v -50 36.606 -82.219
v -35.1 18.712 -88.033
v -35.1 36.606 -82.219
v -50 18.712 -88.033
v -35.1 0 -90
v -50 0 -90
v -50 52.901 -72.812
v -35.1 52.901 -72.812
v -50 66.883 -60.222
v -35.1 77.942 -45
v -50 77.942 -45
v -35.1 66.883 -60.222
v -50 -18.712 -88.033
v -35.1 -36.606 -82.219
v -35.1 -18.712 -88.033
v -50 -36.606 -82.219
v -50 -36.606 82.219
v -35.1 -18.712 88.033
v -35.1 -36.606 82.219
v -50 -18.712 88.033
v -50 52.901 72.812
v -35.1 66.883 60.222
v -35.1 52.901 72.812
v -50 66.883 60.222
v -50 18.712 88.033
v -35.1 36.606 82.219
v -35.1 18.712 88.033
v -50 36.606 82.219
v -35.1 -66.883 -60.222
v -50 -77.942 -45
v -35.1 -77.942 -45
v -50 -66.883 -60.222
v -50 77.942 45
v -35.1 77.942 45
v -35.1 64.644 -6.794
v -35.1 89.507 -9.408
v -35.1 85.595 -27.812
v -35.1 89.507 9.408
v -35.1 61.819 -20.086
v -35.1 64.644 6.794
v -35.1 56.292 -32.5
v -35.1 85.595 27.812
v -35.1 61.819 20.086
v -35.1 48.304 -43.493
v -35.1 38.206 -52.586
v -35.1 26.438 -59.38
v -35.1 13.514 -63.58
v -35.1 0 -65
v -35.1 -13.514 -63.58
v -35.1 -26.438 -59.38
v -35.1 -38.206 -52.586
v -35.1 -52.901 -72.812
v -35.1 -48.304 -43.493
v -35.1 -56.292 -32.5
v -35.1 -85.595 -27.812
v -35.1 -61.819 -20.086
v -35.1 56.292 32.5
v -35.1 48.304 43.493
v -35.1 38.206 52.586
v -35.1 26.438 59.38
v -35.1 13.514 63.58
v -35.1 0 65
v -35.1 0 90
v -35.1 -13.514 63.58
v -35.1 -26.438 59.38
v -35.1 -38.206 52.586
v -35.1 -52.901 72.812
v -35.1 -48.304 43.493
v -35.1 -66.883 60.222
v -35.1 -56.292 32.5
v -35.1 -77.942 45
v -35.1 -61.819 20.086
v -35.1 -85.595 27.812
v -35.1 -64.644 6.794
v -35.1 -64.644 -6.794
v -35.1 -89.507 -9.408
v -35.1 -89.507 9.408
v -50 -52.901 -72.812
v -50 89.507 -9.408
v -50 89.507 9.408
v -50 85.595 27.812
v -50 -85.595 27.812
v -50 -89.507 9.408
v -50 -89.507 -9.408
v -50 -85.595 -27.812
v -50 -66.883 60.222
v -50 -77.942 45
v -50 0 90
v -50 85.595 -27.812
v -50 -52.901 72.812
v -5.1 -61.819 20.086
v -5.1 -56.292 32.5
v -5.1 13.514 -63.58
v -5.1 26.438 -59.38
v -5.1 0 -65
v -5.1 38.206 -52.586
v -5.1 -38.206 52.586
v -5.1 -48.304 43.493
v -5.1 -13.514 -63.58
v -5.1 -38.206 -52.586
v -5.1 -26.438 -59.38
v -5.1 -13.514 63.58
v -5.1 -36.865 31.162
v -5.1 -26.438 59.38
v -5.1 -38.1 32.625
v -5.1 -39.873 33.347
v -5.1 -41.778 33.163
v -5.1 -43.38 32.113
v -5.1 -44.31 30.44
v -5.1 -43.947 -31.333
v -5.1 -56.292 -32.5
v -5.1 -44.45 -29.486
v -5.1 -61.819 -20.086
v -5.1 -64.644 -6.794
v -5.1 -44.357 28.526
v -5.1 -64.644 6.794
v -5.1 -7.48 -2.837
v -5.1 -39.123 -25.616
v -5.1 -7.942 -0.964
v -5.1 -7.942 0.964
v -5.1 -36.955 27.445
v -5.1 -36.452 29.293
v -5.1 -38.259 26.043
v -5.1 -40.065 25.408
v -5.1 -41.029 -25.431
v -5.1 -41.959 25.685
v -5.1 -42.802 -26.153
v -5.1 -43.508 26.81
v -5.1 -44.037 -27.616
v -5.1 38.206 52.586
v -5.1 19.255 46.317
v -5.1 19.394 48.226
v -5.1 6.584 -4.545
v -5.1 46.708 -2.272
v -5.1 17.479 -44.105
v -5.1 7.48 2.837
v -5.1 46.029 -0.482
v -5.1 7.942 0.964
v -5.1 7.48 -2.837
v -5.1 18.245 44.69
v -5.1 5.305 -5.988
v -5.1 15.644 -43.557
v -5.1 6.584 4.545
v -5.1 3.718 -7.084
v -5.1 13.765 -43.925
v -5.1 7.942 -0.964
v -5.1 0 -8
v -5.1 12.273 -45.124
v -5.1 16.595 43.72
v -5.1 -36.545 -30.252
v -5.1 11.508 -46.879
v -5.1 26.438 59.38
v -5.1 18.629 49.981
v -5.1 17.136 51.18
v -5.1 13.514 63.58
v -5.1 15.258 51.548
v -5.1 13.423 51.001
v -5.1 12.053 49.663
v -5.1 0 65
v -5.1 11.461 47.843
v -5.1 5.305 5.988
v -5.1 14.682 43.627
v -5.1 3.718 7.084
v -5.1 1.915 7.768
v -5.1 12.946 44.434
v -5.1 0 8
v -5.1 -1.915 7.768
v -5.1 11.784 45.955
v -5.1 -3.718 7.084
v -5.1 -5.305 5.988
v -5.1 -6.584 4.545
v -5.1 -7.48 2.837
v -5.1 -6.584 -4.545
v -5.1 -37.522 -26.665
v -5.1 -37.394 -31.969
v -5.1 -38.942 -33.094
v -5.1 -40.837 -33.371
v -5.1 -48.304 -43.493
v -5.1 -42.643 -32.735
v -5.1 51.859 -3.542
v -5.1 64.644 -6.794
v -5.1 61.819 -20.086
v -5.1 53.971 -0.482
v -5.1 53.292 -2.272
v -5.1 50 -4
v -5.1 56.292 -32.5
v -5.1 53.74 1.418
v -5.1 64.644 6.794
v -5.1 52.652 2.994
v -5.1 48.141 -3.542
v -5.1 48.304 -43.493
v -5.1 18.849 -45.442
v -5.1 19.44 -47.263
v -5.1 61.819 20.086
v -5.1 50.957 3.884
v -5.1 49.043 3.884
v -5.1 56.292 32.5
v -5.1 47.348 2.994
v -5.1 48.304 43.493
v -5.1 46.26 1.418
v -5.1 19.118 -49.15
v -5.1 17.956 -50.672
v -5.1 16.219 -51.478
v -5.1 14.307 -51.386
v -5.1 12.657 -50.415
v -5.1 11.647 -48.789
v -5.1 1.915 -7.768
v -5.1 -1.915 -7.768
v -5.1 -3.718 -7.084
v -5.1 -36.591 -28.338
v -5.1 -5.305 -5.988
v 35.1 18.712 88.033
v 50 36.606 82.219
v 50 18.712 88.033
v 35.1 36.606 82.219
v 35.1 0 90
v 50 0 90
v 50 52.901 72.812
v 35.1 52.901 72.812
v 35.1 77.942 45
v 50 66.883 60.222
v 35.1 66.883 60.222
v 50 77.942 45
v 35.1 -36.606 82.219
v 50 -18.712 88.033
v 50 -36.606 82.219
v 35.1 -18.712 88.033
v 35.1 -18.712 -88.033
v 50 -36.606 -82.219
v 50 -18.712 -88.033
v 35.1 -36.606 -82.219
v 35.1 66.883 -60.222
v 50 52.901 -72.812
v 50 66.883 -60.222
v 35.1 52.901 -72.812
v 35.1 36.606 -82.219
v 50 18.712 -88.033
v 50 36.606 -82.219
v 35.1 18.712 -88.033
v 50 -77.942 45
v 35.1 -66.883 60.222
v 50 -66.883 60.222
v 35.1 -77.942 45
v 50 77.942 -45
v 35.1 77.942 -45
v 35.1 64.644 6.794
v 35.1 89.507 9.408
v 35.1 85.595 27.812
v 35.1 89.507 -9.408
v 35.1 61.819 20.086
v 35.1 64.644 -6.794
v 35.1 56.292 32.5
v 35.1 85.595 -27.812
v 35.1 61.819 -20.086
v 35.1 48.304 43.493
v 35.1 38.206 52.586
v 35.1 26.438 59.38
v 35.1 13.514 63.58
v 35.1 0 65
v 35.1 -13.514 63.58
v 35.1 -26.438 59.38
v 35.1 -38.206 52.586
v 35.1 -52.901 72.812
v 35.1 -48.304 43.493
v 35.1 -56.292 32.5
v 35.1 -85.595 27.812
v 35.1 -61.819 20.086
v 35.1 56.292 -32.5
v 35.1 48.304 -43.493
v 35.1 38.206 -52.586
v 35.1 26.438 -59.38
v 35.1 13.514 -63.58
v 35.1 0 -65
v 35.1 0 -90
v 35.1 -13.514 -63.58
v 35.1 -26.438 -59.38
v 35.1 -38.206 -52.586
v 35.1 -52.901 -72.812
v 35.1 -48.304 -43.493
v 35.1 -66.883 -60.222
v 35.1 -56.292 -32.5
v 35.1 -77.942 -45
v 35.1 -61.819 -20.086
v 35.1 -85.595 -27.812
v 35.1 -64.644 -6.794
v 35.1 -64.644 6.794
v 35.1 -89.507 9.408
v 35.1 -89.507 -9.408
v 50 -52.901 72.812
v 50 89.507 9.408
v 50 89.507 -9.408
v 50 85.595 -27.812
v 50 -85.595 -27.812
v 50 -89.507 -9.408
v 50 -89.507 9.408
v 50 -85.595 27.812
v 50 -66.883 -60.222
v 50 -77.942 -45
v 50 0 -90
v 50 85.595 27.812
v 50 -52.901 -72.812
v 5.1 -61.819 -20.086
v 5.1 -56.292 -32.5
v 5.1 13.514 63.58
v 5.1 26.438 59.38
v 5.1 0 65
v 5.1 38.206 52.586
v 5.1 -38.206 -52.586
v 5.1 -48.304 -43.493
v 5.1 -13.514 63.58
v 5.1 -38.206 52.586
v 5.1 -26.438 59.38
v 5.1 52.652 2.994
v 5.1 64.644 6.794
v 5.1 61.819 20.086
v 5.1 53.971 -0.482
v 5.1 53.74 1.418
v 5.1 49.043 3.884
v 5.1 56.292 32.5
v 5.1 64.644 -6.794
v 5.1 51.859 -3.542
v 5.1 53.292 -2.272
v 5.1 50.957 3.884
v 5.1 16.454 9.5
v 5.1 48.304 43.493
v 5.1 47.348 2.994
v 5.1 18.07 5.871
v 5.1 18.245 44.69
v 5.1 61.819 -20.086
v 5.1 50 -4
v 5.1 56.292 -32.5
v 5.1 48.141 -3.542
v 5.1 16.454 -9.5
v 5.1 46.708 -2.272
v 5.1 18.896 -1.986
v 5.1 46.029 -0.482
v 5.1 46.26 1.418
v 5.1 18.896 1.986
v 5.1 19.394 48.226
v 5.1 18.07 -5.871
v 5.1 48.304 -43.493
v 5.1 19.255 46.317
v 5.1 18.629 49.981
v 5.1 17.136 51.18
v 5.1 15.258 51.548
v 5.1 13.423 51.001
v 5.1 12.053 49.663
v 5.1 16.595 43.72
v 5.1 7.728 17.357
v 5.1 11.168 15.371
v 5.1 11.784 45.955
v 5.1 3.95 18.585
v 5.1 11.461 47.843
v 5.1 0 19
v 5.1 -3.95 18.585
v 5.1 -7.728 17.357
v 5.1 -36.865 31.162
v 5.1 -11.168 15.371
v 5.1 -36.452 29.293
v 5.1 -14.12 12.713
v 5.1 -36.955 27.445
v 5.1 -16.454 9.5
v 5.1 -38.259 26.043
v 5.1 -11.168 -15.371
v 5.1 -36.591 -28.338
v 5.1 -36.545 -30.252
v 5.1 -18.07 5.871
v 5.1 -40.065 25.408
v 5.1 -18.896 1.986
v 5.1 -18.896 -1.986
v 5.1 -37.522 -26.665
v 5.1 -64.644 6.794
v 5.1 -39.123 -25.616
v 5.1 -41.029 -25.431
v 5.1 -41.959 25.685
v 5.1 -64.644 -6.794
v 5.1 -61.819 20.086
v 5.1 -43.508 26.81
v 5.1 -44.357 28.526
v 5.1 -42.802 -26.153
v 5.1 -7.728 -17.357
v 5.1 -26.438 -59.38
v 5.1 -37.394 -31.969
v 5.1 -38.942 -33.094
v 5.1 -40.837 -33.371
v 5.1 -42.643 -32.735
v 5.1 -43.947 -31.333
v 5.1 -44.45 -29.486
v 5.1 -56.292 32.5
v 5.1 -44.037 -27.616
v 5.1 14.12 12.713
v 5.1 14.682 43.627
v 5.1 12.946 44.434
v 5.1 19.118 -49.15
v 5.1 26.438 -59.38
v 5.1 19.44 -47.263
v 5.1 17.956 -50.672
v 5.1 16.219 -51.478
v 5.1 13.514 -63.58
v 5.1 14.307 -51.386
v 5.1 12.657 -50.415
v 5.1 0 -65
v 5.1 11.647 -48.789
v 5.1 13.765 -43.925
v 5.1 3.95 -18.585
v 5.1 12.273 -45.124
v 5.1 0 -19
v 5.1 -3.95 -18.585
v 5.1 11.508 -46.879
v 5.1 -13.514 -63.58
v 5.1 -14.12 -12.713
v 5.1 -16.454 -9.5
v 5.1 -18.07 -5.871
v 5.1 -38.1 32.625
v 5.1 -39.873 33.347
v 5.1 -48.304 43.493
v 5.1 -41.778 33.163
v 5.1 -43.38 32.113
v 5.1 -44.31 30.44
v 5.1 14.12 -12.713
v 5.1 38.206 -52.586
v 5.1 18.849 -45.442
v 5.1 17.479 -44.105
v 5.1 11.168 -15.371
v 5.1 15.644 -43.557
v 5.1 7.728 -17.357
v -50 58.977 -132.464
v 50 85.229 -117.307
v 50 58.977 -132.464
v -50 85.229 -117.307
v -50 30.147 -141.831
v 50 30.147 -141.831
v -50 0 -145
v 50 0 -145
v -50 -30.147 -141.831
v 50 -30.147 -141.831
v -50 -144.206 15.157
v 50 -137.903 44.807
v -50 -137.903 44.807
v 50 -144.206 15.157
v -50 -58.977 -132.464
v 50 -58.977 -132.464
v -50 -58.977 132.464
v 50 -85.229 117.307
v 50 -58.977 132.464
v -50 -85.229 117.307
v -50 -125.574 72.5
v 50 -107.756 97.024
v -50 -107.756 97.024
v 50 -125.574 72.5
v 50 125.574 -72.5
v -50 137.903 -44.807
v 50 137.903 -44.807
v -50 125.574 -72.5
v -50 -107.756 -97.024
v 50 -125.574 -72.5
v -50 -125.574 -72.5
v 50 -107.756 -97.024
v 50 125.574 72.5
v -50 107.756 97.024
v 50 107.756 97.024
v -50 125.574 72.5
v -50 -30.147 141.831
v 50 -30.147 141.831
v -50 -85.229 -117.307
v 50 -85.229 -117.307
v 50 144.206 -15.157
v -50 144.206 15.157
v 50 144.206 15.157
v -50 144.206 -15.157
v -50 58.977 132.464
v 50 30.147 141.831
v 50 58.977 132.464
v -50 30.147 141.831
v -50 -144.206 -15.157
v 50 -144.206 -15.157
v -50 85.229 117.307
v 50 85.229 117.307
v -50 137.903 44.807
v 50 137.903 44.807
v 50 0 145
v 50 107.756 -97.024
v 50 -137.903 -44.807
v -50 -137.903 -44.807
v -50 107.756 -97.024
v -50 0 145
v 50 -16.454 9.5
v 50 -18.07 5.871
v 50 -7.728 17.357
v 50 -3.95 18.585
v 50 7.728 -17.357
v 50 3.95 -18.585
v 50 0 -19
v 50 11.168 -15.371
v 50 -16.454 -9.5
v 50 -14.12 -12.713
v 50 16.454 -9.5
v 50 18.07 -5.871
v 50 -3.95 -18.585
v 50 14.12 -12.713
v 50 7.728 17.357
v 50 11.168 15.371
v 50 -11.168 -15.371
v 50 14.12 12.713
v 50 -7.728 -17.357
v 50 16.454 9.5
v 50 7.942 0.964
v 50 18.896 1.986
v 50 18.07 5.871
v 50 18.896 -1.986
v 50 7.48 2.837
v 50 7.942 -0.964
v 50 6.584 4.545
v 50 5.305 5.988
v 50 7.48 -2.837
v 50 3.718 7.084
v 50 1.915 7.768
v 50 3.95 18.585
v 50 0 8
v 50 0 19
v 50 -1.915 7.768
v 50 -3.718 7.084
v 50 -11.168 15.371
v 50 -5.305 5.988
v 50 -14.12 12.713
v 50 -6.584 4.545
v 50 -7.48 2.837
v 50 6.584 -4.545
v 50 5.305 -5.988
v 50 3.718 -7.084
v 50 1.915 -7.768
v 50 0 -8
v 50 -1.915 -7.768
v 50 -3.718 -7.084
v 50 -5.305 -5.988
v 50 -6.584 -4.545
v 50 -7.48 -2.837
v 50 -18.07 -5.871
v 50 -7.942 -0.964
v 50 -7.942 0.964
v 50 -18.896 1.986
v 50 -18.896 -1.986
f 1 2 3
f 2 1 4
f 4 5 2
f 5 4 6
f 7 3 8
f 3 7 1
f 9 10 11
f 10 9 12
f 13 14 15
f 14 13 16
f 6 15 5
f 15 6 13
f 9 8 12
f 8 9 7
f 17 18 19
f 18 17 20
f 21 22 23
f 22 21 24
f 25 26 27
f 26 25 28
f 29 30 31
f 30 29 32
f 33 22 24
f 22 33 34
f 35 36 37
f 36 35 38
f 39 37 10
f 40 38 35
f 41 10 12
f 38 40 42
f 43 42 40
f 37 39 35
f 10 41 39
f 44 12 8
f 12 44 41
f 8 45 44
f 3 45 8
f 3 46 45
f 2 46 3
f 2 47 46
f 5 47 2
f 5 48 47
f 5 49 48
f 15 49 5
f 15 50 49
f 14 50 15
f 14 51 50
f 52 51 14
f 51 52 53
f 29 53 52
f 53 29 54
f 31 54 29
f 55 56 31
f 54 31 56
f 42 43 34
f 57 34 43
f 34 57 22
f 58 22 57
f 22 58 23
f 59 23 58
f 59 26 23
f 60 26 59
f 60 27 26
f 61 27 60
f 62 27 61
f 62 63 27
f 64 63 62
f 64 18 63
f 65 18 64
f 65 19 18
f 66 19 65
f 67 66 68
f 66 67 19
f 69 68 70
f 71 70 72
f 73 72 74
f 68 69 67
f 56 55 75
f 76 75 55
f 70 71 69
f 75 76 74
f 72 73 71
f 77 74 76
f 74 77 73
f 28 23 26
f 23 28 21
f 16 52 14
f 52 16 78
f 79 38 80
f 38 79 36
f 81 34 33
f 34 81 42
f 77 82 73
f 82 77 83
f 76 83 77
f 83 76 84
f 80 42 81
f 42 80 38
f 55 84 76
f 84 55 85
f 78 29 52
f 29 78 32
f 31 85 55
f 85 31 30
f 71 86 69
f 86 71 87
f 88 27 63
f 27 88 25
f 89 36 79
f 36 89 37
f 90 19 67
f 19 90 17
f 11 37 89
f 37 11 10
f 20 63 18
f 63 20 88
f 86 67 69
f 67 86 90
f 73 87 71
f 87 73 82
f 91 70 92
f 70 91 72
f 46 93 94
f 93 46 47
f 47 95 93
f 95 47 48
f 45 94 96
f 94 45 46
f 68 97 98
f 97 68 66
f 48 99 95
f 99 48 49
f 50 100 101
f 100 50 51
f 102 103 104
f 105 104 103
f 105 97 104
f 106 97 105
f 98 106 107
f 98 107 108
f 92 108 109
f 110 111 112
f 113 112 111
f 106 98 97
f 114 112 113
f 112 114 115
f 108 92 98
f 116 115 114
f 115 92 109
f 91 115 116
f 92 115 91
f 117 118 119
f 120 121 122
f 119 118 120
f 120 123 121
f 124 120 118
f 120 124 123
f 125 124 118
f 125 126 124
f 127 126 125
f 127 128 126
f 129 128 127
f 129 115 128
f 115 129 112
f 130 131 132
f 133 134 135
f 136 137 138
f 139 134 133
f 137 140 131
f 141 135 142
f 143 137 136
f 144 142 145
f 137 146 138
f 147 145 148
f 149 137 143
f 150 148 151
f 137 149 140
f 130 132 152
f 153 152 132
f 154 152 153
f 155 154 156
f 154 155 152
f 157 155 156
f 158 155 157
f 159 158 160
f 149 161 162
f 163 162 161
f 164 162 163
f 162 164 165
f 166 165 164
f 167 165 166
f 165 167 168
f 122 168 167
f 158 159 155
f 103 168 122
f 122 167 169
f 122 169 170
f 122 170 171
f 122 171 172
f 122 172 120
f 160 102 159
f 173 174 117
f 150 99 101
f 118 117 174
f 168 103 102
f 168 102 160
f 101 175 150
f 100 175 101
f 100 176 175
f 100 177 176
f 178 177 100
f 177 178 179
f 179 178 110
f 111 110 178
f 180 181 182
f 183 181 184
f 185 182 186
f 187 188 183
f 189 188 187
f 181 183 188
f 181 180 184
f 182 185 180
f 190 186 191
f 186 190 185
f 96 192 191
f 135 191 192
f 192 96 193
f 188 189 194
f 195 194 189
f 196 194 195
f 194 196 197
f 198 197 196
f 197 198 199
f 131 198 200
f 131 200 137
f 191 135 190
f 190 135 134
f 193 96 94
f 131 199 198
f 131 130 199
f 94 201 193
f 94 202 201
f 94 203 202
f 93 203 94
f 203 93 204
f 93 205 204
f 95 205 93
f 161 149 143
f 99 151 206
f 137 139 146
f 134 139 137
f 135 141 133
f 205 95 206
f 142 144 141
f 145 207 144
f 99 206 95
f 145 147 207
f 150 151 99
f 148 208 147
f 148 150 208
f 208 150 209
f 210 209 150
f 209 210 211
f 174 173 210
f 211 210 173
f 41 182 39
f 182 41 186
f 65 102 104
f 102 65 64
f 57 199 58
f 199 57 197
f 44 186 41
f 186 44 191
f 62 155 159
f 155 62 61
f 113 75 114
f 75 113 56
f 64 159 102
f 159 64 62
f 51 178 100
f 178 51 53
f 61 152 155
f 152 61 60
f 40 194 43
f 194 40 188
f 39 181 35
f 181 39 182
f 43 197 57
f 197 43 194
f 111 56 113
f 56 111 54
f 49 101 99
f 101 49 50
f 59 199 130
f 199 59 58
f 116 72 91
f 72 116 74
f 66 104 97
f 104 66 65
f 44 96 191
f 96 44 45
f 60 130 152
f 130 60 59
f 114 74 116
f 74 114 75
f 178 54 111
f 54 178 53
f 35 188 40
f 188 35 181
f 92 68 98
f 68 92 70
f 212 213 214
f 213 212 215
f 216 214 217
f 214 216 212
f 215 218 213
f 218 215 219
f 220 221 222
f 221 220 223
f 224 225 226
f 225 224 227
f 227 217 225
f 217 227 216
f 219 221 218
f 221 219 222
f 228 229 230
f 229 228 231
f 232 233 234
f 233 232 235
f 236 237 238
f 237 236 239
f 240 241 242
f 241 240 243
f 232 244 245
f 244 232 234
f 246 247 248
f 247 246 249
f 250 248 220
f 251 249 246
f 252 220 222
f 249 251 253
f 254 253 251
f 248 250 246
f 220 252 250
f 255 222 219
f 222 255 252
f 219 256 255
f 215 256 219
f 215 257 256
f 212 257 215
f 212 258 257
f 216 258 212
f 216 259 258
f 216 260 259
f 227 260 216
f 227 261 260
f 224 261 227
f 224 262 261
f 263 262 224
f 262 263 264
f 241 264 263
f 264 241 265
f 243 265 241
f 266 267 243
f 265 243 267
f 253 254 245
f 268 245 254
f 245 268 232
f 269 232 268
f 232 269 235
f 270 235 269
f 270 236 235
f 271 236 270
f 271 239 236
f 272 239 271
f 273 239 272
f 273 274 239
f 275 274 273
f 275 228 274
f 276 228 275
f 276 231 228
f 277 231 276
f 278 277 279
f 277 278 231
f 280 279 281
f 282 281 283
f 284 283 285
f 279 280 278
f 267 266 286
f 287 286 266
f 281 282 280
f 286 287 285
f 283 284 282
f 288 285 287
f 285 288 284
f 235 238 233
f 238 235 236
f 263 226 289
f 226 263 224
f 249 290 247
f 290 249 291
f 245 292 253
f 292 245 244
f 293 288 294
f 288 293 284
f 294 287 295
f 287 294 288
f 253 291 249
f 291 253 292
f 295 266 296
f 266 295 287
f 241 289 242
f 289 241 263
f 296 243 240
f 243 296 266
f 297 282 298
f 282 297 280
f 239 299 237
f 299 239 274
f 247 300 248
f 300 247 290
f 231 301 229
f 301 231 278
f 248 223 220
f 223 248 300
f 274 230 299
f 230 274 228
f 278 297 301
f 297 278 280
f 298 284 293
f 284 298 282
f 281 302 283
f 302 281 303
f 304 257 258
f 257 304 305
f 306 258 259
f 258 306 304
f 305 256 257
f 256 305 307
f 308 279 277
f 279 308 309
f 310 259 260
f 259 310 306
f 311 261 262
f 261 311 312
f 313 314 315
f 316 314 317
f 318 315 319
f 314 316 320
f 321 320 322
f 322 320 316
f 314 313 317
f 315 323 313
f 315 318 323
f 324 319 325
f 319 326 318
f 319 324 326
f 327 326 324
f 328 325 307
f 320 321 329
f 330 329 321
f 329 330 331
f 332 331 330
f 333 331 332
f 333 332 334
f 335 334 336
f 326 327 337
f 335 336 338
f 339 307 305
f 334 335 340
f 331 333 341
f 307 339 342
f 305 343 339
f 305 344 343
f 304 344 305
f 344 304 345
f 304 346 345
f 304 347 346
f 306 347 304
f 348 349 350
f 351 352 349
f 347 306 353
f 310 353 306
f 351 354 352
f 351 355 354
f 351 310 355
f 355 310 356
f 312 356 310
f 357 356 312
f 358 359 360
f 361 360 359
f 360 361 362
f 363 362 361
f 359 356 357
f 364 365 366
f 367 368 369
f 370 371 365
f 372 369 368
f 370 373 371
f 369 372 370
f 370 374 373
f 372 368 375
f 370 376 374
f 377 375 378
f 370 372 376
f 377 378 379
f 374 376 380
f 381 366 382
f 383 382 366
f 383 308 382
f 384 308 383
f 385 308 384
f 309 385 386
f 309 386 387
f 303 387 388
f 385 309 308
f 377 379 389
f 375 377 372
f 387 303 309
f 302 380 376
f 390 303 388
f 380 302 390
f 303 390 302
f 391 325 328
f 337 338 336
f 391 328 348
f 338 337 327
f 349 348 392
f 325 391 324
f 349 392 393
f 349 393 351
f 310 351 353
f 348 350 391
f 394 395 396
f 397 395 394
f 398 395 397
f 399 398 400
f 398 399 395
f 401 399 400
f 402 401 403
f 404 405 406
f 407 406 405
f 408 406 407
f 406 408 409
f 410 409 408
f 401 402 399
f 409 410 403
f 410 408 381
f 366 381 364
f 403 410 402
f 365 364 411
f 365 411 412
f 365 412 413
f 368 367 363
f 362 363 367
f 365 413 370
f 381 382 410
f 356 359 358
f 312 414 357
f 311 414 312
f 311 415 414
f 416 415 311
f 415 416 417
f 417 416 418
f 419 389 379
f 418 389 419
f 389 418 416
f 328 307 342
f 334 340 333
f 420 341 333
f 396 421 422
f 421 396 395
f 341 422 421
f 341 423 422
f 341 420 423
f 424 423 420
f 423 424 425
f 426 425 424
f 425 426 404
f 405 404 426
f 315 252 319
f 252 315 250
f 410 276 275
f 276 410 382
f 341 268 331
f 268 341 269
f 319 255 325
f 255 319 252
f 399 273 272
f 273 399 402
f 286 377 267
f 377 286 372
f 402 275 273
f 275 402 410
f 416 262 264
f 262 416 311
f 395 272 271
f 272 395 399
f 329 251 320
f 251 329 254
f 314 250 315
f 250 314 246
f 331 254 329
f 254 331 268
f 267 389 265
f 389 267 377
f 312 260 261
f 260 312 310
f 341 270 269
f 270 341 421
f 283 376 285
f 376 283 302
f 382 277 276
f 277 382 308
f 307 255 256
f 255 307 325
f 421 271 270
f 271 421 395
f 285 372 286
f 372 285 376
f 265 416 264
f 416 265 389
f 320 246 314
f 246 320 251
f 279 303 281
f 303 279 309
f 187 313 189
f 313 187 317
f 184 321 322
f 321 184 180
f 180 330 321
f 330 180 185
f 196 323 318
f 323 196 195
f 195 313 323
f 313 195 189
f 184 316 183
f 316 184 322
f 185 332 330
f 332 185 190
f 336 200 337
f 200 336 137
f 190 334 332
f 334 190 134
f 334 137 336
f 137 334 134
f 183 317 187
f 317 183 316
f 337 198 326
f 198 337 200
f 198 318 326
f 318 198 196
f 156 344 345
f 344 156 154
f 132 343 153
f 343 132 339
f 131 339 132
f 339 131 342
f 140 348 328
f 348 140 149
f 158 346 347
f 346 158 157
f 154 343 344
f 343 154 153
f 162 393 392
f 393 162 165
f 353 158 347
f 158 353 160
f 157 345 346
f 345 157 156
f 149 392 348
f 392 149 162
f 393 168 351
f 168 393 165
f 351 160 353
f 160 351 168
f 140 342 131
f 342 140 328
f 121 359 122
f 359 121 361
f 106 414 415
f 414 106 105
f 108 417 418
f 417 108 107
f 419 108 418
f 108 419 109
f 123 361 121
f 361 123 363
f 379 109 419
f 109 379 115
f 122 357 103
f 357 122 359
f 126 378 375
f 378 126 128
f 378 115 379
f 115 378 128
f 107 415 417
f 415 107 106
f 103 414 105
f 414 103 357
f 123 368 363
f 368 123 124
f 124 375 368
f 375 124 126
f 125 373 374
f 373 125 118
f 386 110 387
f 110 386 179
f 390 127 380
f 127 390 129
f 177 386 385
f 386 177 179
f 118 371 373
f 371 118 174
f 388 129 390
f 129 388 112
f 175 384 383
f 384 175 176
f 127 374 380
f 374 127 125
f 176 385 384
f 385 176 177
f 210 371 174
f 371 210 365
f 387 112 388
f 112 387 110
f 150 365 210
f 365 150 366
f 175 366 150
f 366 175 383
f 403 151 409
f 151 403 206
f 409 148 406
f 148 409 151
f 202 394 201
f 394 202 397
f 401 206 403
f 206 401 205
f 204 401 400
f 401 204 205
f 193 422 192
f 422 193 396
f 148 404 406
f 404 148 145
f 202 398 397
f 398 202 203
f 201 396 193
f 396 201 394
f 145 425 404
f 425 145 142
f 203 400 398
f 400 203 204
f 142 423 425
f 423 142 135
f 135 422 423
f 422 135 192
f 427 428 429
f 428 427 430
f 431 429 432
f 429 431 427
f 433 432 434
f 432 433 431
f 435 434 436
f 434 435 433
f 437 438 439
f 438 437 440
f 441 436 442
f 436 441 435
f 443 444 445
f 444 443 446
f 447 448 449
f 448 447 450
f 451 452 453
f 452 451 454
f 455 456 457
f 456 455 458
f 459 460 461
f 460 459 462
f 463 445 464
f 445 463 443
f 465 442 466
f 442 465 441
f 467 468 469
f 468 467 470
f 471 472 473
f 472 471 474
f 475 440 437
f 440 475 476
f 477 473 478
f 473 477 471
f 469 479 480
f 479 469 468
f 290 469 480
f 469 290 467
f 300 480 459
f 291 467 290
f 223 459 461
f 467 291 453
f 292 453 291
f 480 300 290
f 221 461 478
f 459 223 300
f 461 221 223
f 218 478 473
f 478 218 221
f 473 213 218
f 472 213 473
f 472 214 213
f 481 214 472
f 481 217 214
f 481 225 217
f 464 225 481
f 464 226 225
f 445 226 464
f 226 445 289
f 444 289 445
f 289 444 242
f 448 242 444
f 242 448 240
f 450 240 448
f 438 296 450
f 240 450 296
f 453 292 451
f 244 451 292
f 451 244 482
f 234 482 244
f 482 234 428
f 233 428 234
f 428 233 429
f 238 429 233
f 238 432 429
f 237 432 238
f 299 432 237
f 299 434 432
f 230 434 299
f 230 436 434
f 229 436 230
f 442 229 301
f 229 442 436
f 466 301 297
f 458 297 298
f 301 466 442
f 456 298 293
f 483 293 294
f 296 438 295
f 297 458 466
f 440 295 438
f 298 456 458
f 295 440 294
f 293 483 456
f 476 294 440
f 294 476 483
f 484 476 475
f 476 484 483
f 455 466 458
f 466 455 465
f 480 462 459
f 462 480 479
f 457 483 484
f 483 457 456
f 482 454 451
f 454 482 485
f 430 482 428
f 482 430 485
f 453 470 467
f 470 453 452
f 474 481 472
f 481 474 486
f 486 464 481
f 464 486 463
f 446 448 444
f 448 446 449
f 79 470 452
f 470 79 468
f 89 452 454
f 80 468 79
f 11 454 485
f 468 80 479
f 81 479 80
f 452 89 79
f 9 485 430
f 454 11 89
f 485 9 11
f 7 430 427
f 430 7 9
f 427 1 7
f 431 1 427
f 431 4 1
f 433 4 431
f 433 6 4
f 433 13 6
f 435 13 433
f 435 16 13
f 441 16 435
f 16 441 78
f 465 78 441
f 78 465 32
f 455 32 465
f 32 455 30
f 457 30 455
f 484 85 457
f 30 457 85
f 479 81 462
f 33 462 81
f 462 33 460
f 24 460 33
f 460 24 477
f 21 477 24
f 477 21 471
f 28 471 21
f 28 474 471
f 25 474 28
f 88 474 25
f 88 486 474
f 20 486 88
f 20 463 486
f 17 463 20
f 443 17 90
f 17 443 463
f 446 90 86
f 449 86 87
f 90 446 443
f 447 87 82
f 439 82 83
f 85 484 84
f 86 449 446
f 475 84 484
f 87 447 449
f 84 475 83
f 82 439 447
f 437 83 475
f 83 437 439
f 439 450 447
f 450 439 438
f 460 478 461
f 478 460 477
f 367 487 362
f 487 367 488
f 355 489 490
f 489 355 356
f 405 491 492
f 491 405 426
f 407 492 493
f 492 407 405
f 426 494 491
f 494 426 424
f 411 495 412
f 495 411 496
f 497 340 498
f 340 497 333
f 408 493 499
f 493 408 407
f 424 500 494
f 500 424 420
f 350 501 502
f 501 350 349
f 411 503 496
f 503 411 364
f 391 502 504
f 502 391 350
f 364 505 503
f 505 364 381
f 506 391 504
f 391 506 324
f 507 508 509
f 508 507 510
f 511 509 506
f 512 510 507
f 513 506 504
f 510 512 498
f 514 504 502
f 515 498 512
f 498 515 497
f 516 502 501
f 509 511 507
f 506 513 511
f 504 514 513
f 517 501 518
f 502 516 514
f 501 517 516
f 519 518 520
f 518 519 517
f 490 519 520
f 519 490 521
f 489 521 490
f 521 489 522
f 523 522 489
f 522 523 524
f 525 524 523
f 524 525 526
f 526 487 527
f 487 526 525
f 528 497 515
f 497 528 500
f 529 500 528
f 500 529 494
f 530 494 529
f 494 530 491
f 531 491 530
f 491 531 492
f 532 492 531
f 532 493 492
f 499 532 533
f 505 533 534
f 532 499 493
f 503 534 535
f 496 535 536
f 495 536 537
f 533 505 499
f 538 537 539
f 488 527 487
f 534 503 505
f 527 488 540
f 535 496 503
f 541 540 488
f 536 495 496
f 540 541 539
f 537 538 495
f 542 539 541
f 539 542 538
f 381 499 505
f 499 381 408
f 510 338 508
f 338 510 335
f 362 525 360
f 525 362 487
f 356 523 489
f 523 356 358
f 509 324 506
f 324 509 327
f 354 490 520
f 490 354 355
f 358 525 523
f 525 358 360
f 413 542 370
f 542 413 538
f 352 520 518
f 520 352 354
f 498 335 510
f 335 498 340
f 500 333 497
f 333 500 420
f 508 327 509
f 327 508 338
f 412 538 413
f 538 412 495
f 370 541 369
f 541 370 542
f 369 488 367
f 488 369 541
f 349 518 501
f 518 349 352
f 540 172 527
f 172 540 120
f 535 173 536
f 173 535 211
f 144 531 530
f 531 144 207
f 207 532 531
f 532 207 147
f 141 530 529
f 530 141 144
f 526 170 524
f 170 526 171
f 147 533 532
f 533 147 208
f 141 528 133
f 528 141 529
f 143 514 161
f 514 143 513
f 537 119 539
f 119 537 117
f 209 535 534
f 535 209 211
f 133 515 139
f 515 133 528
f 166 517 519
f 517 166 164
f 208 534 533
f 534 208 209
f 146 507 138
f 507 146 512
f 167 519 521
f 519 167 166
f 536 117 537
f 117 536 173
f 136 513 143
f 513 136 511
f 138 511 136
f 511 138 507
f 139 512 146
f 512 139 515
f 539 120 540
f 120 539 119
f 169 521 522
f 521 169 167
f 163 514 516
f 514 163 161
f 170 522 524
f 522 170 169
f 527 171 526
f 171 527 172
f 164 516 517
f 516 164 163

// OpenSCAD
module Wheel()
{
  big = 250;
  thickness = 100;

  rotate([0, 90, 0])
  {
    difference()
    {
      union()
      {
        difference()
        {
          /* Outer dimensions */
          cylinder(d=290, h=thickness, center=true);

          /* Wheel */
          for(a = [0, 180])
          {
            rotate([0, a, 0])
            {
              translate([0, 0, -thickness / 2 - 0.1])
              {
                cylinder(d=180, h=15);
                cylinder(d=130, h=45);
              }
            }
          }

          /* Bolts */
          for(a = [0 : 360 / 5 : 359])
          {
            rotate([0, 0, a])
            {
              translate([0, 50, 0])
              {
                cylinder(d=8, h=big, center=true);
              }
            }
          }
        }

        cylinder(h=thickness/2, d=38);
      }

      /* Shaft */
      cylinder(d=16, h=big, center=true);
    }
  }
}

Wheel();
